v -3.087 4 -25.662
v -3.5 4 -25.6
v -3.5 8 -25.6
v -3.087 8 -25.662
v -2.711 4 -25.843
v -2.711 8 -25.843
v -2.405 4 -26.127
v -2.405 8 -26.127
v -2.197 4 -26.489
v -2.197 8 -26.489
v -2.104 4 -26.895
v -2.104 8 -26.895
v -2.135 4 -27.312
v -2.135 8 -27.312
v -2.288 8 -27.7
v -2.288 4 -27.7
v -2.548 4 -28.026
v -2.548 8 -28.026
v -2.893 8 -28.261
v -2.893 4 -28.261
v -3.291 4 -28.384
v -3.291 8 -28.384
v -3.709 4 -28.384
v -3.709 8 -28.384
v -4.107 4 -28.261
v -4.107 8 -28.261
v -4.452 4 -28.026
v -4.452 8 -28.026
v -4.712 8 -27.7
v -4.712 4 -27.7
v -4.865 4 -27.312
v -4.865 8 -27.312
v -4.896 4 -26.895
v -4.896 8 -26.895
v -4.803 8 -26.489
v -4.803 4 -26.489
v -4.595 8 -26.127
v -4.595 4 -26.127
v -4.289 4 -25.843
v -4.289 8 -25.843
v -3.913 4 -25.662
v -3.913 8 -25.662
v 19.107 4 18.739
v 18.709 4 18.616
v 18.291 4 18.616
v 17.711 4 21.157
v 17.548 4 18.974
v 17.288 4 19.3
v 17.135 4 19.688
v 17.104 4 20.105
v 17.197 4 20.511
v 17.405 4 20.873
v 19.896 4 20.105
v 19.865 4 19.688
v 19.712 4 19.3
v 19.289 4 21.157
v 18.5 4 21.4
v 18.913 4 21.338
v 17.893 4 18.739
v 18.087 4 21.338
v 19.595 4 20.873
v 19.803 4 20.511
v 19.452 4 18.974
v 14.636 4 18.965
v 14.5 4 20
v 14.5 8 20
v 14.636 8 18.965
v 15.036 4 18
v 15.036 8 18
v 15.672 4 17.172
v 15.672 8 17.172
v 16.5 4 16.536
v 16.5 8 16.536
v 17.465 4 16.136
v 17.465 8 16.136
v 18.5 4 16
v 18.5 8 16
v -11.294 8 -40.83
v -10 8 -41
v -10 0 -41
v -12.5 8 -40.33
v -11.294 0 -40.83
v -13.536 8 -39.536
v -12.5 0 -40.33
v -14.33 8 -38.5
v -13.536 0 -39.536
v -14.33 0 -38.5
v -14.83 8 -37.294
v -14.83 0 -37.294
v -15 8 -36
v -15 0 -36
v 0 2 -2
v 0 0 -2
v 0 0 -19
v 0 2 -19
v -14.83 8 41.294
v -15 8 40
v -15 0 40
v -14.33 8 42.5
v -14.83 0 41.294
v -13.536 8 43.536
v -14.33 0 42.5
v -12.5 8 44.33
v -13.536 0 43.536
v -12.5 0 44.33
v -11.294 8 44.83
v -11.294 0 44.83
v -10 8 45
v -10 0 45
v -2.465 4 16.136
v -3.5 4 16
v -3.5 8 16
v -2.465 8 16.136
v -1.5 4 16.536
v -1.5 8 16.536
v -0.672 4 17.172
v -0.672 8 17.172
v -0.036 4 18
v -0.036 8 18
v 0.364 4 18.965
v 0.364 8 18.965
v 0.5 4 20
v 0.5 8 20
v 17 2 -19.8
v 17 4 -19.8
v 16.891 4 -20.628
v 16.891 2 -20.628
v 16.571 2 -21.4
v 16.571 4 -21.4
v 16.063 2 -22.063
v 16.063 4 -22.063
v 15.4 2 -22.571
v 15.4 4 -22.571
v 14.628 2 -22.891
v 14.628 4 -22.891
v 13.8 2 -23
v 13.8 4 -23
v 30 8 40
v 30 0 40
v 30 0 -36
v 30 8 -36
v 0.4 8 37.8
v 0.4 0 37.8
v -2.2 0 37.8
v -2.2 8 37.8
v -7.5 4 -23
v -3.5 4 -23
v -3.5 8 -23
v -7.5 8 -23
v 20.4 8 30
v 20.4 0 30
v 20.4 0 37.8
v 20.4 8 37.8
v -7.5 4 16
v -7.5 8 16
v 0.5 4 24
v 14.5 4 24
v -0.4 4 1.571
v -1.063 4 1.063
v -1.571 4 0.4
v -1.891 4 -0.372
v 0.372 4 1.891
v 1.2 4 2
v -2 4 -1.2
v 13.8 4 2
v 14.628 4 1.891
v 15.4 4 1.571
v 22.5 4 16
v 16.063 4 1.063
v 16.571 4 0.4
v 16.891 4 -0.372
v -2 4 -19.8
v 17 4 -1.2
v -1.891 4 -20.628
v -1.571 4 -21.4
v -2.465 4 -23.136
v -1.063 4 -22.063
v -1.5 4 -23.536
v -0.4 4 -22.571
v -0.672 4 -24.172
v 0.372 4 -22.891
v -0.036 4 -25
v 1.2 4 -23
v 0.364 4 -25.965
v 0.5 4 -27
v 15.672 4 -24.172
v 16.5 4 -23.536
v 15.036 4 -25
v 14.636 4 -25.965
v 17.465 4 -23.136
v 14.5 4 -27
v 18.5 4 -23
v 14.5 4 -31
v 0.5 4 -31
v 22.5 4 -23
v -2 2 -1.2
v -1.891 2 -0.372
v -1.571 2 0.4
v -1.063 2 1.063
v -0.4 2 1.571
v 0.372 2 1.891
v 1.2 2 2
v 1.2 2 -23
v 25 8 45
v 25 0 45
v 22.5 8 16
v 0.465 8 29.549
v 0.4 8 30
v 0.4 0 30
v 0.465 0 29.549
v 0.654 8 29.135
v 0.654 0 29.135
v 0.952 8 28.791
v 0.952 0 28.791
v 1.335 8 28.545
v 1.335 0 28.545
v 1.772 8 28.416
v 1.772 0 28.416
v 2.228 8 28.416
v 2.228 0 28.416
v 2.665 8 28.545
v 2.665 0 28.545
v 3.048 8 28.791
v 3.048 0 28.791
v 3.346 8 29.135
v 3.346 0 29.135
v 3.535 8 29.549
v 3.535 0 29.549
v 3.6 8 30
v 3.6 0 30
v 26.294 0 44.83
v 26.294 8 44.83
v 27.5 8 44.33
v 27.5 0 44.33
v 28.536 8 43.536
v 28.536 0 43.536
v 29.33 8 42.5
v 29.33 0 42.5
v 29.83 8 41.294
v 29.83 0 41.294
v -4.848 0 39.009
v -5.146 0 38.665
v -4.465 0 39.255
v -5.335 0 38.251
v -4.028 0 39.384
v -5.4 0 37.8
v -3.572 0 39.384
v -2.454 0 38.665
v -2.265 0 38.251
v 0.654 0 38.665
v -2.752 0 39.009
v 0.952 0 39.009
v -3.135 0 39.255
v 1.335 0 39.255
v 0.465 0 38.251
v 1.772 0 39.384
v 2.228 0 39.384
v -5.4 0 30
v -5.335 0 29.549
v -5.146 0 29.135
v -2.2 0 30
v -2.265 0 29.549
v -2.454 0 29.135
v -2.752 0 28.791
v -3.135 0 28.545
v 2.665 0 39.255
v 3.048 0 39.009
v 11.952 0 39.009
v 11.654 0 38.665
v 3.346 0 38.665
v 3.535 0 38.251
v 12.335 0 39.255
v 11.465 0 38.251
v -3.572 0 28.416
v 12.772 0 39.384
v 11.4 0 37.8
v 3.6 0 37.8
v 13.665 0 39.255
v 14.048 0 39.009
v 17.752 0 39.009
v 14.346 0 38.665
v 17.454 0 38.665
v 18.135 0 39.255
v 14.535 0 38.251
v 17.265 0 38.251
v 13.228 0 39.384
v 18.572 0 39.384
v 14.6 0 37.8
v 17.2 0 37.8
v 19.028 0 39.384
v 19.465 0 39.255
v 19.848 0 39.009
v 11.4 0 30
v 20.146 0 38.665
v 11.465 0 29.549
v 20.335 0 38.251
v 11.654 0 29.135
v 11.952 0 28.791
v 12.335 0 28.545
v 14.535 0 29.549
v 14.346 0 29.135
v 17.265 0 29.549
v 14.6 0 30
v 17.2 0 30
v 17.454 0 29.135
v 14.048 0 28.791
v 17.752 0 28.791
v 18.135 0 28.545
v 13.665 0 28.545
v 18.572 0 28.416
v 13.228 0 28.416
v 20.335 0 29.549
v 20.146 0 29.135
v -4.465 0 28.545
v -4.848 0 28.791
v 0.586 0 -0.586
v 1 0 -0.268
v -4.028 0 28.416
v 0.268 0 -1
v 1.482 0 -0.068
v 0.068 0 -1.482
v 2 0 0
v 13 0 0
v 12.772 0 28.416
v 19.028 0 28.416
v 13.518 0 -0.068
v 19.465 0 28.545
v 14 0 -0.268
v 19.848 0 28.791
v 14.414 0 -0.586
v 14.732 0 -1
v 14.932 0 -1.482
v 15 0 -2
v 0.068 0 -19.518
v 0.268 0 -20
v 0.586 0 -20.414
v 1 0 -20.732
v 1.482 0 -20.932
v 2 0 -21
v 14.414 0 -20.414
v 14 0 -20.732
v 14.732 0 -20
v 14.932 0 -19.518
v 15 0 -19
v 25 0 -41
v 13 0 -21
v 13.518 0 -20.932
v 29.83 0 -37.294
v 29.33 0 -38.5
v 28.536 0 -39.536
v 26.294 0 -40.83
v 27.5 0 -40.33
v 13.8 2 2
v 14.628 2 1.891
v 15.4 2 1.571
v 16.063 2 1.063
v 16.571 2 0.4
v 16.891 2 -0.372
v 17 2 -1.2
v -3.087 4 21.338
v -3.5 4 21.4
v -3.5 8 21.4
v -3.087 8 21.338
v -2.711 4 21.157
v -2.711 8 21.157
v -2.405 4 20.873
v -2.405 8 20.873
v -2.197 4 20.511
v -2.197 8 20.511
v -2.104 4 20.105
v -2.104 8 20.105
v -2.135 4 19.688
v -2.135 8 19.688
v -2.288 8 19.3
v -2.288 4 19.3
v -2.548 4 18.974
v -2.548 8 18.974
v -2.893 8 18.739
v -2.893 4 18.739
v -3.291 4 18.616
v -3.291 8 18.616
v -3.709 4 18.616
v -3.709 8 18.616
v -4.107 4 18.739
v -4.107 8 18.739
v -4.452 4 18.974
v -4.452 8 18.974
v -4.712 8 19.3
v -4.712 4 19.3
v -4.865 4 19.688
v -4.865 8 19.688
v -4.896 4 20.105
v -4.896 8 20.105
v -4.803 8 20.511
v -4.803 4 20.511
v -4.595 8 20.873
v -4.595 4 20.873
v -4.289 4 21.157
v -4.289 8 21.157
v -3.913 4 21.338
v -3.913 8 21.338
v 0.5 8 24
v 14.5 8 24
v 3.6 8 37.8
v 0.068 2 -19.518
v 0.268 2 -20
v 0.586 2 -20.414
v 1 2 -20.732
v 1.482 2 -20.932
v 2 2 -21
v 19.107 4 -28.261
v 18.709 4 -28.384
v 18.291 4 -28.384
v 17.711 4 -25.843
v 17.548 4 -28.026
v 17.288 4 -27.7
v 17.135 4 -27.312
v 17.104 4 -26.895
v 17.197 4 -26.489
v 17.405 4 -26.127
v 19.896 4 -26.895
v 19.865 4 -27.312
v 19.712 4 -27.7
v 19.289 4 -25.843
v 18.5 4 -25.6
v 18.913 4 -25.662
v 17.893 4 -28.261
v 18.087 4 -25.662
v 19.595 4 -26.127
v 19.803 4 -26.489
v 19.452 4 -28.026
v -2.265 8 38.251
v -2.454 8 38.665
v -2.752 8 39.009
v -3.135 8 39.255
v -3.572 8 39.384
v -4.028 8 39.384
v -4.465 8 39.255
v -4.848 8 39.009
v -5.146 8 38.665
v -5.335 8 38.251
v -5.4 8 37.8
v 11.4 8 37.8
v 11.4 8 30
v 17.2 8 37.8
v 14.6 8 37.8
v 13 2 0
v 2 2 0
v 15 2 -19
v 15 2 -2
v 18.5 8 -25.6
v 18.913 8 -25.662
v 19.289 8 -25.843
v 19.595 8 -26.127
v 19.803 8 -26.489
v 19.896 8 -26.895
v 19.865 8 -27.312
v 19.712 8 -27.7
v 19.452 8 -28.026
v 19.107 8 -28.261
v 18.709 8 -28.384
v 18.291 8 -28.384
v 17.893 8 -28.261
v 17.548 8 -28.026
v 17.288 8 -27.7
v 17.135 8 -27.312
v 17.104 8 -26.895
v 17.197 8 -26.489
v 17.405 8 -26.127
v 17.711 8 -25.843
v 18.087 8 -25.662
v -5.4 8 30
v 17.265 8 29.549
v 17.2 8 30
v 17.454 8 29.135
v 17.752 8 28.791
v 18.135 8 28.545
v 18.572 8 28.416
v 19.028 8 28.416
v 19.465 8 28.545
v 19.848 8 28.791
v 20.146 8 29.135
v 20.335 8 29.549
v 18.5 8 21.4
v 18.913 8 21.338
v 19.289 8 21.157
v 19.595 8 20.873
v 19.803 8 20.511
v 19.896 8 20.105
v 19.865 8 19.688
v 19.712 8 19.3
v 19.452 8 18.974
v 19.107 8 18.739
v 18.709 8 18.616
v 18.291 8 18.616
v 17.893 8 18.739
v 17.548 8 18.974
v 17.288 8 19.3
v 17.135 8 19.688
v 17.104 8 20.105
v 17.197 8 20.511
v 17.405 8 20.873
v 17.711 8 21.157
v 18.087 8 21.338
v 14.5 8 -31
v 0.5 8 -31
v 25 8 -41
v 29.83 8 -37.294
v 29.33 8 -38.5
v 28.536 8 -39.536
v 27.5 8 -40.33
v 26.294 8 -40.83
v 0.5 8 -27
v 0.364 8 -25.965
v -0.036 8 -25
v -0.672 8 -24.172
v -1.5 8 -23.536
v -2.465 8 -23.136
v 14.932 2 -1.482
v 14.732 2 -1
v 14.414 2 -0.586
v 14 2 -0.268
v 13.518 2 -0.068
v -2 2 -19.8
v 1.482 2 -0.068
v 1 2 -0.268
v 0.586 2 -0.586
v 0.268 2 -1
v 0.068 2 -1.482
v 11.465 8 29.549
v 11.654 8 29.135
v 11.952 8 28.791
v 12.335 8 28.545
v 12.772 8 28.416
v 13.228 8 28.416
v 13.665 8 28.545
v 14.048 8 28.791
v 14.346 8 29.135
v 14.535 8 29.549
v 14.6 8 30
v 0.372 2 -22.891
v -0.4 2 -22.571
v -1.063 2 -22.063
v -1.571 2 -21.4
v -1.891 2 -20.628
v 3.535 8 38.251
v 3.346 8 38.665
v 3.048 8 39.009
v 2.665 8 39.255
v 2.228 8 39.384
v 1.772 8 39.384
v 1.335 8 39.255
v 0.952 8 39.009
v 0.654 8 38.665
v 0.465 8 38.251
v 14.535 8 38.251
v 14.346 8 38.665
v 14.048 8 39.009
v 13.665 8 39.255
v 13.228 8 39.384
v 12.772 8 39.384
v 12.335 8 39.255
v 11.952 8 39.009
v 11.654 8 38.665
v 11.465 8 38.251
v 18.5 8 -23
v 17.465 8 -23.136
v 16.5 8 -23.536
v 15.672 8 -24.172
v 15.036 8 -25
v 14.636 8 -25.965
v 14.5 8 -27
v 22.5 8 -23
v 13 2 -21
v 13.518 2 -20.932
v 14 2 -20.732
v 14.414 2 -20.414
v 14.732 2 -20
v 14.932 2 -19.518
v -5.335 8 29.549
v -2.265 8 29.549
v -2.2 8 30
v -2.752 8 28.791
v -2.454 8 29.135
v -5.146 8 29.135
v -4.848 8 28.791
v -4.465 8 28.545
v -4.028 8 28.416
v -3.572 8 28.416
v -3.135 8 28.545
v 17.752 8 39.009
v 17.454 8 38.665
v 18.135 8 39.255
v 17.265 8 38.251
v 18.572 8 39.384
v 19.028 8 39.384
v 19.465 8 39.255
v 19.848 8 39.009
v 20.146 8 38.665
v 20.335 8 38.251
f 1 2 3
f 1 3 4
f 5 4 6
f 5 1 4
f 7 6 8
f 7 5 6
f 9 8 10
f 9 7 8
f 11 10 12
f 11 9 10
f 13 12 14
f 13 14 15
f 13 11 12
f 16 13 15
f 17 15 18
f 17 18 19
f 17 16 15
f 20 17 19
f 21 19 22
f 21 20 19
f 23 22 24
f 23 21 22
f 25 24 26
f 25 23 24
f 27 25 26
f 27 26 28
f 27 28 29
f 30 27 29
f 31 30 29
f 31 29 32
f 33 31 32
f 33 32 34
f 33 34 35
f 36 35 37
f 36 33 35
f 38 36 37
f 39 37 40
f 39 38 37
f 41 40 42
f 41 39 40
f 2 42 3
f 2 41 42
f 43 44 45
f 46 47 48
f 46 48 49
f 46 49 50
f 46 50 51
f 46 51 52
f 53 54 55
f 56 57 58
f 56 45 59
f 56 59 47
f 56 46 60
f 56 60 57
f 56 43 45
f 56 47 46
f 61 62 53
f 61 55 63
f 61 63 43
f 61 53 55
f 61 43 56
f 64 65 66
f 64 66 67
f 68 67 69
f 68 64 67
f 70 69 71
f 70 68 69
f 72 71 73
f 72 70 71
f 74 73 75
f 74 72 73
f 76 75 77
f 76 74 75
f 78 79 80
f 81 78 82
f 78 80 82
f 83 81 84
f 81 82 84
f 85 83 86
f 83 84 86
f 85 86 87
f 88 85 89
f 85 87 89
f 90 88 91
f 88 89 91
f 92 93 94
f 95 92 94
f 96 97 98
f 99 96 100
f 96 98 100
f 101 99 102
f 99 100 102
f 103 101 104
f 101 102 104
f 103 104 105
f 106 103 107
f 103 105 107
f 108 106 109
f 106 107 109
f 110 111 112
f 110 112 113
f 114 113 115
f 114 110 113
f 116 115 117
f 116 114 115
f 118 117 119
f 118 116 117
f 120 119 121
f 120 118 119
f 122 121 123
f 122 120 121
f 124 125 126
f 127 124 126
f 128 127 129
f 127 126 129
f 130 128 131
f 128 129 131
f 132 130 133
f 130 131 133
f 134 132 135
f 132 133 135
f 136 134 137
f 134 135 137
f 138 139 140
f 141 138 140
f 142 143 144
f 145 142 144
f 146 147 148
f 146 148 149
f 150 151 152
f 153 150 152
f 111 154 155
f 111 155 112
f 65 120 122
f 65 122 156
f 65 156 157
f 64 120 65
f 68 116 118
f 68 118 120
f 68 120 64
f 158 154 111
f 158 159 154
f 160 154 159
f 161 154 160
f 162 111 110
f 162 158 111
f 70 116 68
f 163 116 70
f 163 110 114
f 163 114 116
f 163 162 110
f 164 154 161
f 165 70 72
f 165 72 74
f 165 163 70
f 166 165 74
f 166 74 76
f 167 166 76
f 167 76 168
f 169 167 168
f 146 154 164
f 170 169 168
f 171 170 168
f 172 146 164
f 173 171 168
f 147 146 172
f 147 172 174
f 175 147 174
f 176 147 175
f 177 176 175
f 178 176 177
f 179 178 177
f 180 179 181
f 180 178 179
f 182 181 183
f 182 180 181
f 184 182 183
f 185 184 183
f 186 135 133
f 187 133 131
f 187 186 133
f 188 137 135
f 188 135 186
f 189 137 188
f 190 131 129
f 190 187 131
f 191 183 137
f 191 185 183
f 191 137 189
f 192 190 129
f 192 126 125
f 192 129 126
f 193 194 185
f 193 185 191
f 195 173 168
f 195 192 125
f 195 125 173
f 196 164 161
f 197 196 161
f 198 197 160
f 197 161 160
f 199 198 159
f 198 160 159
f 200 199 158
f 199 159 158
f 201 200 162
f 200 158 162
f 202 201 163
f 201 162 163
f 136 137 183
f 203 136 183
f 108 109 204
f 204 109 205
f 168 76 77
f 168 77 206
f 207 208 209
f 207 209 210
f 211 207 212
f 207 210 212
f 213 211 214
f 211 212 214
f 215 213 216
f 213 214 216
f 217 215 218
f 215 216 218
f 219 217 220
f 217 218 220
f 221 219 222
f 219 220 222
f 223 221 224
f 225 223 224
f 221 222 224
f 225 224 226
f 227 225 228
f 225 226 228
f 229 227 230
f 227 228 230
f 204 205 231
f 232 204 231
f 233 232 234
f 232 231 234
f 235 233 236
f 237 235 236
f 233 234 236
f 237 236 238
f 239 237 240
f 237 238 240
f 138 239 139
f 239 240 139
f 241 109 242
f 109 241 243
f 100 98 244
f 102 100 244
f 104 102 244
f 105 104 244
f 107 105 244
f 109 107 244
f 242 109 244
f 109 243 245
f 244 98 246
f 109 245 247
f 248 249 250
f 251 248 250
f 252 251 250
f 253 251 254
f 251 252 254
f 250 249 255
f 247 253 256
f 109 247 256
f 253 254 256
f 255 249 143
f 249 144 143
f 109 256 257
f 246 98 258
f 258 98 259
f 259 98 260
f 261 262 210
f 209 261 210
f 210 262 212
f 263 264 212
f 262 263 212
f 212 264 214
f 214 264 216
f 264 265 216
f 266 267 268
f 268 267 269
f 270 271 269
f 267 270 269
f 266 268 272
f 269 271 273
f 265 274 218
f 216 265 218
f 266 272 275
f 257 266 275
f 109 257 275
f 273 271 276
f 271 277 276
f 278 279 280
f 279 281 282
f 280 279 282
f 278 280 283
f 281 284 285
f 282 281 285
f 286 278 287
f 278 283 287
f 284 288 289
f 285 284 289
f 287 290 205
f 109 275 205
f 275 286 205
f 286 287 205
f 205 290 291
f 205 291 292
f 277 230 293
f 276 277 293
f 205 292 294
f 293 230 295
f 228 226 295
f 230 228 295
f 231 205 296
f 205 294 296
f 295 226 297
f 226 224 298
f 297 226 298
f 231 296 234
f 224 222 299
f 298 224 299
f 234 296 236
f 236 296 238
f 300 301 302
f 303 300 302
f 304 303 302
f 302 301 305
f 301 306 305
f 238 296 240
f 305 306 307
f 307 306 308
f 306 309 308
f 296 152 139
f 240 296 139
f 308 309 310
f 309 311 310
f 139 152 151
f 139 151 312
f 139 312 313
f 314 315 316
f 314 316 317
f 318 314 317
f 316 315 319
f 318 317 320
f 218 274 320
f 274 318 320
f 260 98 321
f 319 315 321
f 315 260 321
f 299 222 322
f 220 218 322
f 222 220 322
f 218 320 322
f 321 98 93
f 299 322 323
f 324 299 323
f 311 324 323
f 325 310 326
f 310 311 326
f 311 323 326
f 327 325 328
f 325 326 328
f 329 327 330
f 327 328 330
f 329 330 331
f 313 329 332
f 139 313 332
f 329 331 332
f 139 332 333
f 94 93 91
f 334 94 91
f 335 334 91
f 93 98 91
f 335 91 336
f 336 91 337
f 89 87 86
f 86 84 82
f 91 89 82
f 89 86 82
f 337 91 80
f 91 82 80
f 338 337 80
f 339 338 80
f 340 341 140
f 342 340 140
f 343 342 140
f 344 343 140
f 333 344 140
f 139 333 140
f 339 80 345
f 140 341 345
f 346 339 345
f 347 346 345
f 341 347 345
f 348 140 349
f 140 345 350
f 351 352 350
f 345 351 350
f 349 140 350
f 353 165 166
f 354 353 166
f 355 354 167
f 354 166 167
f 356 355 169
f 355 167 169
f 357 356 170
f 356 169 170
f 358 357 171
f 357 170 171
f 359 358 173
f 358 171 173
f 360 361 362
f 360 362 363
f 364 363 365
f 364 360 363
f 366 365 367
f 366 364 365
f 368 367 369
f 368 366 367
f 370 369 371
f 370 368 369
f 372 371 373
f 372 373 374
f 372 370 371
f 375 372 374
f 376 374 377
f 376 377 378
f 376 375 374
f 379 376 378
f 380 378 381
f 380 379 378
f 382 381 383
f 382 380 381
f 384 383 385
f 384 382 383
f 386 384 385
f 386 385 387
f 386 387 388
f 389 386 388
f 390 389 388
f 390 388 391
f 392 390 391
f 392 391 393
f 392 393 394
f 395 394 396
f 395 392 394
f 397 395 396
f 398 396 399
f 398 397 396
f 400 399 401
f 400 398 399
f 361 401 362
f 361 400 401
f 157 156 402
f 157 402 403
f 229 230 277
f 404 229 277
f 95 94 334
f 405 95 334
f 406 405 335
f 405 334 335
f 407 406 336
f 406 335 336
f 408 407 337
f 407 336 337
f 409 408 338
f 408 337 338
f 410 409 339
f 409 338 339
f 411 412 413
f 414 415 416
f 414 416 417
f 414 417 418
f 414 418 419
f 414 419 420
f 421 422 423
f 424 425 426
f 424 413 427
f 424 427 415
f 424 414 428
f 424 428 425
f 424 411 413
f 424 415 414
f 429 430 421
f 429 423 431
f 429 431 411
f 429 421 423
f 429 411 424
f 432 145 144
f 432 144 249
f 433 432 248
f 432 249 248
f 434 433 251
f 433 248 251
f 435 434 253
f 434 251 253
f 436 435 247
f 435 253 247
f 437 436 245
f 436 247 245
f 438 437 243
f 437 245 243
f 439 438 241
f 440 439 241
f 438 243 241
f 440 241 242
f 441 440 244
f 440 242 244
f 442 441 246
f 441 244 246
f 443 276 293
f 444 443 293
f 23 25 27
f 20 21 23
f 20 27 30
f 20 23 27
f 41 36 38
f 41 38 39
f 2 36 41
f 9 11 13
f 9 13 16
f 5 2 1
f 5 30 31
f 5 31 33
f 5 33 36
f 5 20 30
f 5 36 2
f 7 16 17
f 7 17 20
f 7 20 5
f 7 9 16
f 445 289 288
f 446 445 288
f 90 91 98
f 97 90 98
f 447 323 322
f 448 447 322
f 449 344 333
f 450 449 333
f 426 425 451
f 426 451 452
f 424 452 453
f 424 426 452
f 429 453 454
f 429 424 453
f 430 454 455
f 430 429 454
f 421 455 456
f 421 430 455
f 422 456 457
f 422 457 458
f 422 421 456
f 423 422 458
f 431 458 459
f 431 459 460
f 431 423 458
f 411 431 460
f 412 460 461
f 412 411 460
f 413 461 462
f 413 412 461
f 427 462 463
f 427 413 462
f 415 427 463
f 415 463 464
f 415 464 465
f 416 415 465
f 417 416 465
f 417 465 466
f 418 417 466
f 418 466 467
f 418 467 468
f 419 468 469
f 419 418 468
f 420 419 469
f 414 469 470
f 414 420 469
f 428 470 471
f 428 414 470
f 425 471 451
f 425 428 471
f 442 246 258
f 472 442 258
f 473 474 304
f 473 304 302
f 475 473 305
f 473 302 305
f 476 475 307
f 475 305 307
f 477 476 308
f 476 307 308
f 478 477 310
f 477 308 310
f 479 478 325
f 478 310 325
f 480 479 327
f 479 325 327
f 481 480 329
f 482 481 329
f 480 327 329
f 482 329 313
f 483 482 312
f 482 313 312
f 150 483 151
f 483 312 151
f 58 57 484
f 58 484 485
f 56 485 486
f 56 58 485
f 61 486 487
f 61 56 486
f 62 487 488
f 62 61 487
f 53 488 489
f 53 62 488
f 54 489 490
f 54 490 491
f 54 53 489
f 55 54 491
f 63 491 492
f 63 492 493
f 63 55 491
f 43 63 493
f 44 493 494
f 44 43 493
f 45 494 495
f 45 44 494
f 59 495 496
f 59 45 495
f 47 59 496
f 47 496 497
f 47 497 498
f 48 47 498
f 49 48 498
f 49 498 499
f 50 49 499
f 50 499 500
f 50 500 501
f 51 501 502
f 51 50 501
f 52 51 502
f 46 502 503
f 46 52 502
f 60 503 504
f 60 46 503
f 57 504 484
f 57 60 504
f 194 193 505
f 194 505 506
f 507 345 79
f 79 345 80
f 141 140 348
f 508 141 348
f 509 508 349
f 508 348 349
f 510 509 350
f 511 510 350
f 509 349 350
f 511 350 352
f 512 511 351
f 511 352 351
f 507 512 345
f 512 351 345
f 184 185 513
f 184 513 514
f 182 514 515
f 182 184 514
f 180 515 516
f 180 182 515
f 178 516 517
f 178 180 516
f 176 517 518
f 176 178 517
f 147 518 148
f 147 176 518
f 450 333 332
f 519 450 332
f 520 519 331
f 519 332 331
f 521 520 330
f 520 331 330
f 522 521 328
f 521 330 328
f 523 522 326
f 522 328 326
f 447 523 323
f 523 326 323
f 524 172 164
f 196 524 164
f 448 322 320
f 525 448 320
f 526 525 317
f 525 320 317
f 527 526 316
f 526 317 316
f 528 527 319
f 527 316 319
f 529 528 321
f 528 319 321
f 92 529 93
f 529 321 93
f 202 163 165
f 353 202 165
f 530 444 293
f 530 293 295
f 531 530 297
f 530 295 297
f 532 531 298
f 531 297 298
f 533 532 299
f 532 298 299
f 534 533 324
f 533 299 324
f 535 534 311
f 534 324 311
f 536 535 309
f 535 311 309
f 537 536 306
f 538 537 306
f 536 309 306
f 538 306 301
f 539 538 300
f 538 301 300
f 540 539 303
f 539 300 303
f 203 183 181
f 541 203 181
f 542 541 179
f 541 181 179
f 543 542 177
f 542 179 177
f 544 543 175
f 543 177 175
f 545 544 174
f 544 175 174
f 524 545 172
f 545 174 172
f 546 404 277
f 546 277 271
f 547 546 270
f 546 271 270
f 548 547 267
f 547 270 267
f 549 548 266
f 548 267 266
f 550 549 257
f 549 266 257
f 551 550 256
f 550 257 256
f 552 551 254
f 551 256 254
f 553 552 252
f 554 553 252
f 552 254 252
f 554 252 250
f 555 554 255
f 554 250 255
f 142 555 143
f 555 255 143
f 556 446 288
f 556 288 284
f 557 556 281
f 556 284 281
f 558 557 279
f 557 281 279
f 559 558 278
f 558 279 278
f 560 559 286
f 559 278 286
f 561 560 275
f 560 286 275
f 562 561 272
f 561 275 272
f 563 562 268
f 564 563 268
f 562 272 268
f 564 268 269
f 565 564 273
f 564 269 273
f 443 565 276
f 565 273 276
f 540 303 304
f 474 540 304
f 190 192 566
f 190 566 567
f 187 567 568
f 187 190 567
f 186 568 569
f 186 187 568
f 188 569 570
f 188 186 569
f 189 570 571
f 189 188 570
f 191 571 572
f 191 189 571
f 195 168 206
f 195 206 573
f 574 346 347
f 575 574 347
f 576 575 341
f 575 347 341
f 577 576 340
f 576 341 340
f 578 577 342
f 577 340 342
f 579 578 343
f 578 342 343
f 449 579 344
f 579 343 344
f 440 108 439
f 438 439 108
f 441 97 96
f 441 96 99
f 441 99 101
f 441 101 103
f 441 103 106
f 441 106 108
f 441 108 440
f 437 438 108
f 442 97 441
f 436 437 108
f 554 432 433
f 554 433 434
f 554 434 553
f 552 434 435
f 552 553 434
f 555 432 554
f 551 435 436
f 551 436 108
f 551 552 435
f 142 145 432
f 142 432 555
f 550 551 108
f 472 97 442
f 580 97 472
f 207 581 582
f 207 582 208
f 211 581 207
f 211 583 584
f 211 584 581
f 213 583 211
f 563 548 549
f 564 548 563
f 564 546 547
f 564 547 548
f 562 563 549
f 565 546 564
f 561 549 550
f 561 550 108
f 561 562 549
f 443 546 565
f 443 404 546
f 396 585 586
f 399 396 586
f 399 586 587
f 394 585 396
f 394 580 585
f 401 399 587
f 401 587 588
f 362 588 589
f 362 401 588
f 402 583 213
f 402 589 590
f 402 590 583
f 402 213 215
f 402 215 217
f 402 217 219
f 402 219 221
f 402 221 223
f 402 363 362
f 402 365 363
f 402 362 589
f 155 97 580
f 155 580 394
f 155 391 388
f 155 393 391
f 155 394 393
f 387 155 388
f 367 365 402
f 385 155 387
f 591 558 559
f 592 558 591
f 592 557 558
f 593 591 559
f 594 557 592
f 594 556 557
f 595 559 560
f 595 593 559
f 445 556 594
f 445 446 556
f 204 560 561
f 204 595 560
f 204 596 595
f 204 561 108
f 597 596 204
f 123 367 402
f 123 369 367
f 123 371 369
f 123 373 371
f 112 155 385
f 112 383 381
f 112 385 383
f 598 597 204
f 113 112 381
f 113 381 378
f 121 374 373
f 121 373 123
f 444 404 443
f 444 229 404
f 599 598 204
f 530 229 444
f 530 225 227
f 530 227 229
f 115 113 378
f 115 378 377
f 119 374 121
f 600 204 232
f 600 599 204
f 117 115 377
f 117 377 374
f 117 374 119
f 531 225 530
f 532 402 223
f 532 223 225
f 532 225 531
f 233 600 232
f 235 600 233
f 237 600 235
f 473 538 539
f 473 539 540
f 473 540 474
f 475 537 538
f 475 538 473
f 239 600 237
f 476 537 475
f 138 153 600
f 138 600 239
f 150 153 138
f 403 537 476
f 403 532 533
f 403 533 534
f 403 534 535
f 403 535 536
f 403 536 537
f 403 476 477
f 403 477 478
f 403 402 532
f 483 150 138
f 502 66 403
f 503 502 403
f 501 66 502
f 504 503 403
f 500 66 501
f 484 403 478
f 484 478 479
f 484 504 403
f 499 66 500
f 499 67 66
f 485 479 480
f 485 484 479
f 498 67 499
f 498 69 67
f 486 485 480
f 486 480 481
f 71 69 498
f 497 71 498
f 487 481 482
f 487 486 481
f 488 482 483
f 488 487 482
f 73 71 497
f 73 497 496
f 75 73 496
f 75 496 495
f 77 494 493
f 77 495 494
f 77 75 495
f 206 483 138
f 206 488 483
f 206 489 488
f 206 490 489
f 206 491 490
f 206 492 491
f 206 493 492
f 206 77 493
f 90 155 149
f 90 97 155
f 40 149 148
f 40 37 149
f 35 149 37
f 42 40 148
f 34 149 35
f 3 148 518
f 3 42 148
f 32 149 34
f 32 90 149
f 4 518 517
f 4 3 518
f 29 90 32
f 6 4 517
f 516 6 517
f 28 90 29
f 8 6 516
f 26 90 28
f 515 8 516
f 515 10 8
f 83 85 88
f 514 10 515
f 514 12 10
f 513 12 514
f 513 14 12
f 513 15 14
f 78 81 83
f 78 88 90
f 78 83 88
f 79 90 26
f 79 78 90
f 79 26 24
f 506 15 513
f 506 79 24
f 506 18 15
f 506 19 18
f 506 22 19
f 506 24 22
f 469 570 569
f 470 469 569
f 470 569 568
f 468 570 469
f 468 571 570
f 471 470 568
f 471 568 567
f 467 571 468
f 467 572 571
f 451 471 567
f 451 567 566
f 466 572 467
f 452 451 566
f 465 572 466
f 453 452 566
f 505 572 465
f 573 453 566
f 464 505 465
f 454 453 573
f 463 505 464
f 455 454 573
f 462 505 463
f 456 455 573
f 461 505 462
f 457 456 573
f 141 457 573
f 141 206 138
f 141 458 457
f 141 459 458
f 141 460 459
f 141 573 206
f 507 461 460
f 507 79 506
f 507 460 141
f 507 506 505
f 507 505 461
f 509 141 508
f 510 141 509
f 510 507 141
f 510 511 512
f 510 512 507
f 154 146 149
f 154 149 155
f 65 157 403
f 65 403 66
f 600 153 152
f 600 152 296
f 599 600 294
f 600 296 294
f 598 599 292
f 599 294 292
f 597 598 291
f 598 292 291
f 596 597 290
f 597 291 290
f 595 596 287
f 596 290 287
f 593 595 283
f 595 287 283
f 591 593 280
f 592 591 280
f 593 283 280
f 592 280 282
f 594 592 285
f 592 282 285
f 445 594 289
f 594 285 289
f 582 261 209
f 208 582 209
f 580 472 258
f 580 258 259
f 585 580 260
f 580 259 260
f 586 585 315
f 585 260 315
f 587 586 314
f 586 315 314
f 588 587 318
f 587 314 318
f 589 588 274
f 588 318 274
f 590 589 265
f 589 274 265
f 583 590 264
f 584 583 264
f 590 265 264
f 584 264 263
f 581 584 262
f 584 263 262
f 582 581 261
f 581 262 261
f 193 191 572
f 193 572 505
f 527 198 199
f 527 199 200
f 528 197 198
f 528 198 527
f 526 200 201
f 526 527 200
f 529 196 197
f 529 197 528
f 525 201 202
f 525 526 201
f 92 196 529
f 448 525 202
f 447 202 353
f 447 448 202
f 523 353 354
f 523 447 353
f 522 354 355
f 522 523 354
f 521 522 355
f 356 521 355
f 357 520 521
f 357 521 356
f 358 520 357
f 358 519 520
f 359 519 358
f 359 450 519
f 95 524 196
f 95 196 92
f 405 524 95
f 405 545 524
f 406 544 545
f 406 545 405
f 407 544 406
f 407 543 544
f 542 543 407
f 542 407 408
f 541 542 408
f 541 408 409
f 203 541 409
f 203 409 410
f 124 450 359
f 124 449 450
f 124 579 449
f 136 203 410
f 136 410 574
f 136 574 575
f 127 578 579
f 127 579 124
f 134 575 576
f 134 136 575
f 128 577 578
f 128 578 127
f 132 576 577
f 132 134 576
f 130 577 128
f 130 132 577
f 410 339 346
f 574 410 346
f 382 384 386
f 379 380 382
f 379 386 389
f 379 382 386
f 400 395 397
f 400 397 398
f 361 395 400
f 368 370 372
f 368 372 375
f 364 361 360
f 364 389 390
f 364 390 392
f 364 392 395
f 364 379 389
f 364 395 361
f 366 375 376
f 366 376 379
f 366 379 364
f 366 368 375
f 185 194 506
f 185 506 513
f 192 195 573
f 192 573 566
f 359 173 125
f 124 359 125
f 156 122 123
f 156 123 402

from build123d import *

# Parameters (mm, degrees)
BOSS_EXTRUDE1_DEPTH = 8
CUT_EXTRUDE1_START  = -4
SKETCH3_R           = 1.4
CUT_EXTRUDE1_DEPTH  = 4
CUT_EXTRUDE2_DEPTH  = 2


with BuildPart() as part:
    # Sketch1 → Boss-Extrude1 (new body)
    with BuildSketch(Plane(origin=(0, 0, 0), x_dir=(1, 0, 0), z_dir=(0, 1, 0))):
        with BuildLine():
            Line((25, 41), (-10, 41))
            ThreePointArc((-10, 41), (-13.535533906, 39.535533906), (-15, 36))
            Line((-15, 36), (-15, -40))
            ThreePointArc((-15, -40), (-13.535533906, -43.535533906), (-10, -45))
            Line((-10, -45), (25, -45))
            ThreePointArc((25, -45), (28.535533906, -43.535533906), (30, -40))
            Line((30, -40), (30, 36))
            ThreePointArc((30, 36), (28.535533906, 39.535533906), (25, 41))
        make_face()
        with BuildLine():
            Line((-5.4, -37.8), (-5.4, -30))
            ThreePointArc((-5.4, -30), (-3.8, -28.4), (-2.2, -30))
            Line((-2.2, -30), (0.4, -30))
            ThreePointArc((0.4, -30), (2, -28.4), (3.6, -30))
            Line((3.6, -30), (3.6, -37.8))
            ThreePointArc((3.6, -37.8), (2, -39.4), (0.4, -37.8))
            Line((0.4, -37.8), (-2.2, -37.8))
            ThreePointArc((-2.2, -37.8), (-3.8, -39.4), (-5.4, -37.8))
        make_face(mode=Mode.SUBTRACT)
        with BuildLine():
            Line((11.4, -37.8), (11.4, -30))
            ThreePointArc((11.4, -30), (13, -28.4), (14.6, -30))
            Line((14.6, -30), (17.2, -30))
            ThreePointArc((17.2, -30), (18.8, -28.4), (20.4, -30))
            Line((20.4, -30), (20.4, -37.8))
            ThreePointArc((20.4, -37.8), (18.8, -39.4), (17.2, -37.8))
            Line((17.2, -37.8), (14.6, -37.8))
            ThreePointArc((14.6, -37.8), (13, -39.4), (11.4, -37.8))
        make_face(mode=Mode.SUBTRACT)
        with BuildLine():
            Line((13, 0), (2, 0))
            ThreePointArc((2, 0), (0.585786438, 0.585786438), (0, 2))
            Line((0, 2), (0, 19))
            ThreePointArc((0, 19), (0.585786438, 20.414213562), (2, 21))
            Line((2, 21), (13, 21))
            ThreePointArc((13, 21), (14.414213562, 20.414213562), (15, 19))
            Line((15, 19), (15, 2))
            ThreePointArc((15, 2), (14.414213562, 0.585786438), (13, 0))
        make_face(mode=Mode.SUBTRACT)
    extrude(amount=BOSS_EXTRUDE1_DEPTH)

    # Sketch3 → Cut-Extrude1 (cut)
    # profile 1 of 5: a face of its own
    with BuildSketch(Plane(origin=(0, 8, 0), x_dir=(1, 0, 0), z_dir=(0, 1, 0)).offset(CUT_EXTRUDE1_START)):
        with BuildLine():
            Line((14.5, 31), (0.5, 31))
            Line((0.5, 31), (0.5, 27))
            ThreePointArc((0.5, 27), (-0.671572875, 24.171572875), (-3.5, 23))
            Line((-3.5, 23), (-7.5, 23))
            Line((-7.5, 23), (-7.5, -16))
            Line((-7.5, -16), (-3.5, -16))
            ThreePointArc((-3.5, -16), (-0.671572875, -17.171572875), (0.5, -20))
            Line((0.5, -20), (0.5, -24))
            Line((0.5, -24), (14.5, -24))
            Line((14.5, -24), (14.5, -20))
            ThreePointArc((14.5, -20), (15.671572875, -17.171572875), (18.5, -16))
            Line((18.5, -16), (22.5, -16))
            Line((22.5, -16), (22.5, 23))
            Line((22.5, 23), (18.5, 23))
            ThreePointArc((18.5, 23), (15.671572875, 24.171572875), (14.5, 27))
            Line((14.5, 27), (14.5, 31))
        make_face()
        with BuildLine():
            ThreePointArc((13, 21), (14.414213562, 20.414213562), (15, 19))
            Line((15, 19), (15, 2))
            ThreePointArc((15, 2), (14.414213562, 0.585786438), (13, 0))
            Line((13, 0), (2, 0))
            ThreePointArc((2, 0), (0.585786438, 0.585786438), (0, 2))
            Line((0, 2), (0, 19))
            ThreePointArc((0, 19), (0.585786438, 20.414213562), (2, 21))
            Line((2, 21), (13, 21))
        make_face(mode=Mode.SUBTRACT)
    # profile 2 of 5: a face of its own
    with BuildSketch(Plane(origin=(0, 8, 0), x_dir=(1, 0, 0), z_dir=(0, 1, 0)).offset(CUT_EXTRUDE1_START)):
        with Locations(Location((-3.5, 27, 0), (0, 0, 270))):
            Circle(SKETCH3_R)
    # profile 3 of 5: a face of its own
    with BuildSketch(Plane(origin=(0, 8, 0), x_dir=(1, 0, 0), z_dir=(0, 1, 0)).offset(CUT_EXTRUDE1_START)):
        with Locations(Location((18.5, 27, 0), (0, 0, 270))):
            Circle(SKETCH3_R)
    # profile 4 of 5: a face of its own
    with BuildSketch(Plane(origin=(0, 8, 0), x_dir=(1, 0, 0), z_dir=(0, 1, 0)).offset(CUT_EXTRUDE1_START)):
        with Locations(Location((-3.5, -20, 0), (0, 0, 270))):
            Circle(SKETCH3_R)
    # profile 5 of 5: a face of its own
    with BuildSketch(Plane(origin=(0, 8, 0), x_dir=(1, 0, 0), z_dir=(0, 1, 0)).offset(CUT_EXTRUDE1_START)):
        with Locations(Location((18.5, -20, 0), (0, 0, 270))):
            Circle(SKETCH3_R)
    extrude(amount=CUT_EXTRUDE1_DEPTH, mode=Mode.SUBTRACT)

    # Sketch5 → Cut-Extrude2 (cut)
    with BuildSketch(Plane(origin=(0, 4, 0), x_dir=(1, 0, 0), z_dir=(0, 1, 0))):
        with BuildLine():
            Line((1.2, -2), (13.8, -2))
            ThreePointArc((13.8, -2), (16.0627417, -1.0627417), (17, 1.2))
            Line((17, 1.2), (17, 19.8))
            ThreePointArc((17, 19.8), (16.0627417, 22.0627417), (13.8, 23))
            Line((13.8, 23), (1.2, 23))
            ThreePointArc((1.2, 23), (-1.0627417, 22.0627417), (-2, 19.8))
            Line((-2, 19.8), (-2, 1.2))
            ThreePointArc((-2, 1.2), (-1.0627417, -1.0627417), (1.2, -2))
        make_face()
    extrude(amount=-CUT_EXTRUDE2_DEPTH, mode=Mode.SUBTRACT)


solid = part.part
